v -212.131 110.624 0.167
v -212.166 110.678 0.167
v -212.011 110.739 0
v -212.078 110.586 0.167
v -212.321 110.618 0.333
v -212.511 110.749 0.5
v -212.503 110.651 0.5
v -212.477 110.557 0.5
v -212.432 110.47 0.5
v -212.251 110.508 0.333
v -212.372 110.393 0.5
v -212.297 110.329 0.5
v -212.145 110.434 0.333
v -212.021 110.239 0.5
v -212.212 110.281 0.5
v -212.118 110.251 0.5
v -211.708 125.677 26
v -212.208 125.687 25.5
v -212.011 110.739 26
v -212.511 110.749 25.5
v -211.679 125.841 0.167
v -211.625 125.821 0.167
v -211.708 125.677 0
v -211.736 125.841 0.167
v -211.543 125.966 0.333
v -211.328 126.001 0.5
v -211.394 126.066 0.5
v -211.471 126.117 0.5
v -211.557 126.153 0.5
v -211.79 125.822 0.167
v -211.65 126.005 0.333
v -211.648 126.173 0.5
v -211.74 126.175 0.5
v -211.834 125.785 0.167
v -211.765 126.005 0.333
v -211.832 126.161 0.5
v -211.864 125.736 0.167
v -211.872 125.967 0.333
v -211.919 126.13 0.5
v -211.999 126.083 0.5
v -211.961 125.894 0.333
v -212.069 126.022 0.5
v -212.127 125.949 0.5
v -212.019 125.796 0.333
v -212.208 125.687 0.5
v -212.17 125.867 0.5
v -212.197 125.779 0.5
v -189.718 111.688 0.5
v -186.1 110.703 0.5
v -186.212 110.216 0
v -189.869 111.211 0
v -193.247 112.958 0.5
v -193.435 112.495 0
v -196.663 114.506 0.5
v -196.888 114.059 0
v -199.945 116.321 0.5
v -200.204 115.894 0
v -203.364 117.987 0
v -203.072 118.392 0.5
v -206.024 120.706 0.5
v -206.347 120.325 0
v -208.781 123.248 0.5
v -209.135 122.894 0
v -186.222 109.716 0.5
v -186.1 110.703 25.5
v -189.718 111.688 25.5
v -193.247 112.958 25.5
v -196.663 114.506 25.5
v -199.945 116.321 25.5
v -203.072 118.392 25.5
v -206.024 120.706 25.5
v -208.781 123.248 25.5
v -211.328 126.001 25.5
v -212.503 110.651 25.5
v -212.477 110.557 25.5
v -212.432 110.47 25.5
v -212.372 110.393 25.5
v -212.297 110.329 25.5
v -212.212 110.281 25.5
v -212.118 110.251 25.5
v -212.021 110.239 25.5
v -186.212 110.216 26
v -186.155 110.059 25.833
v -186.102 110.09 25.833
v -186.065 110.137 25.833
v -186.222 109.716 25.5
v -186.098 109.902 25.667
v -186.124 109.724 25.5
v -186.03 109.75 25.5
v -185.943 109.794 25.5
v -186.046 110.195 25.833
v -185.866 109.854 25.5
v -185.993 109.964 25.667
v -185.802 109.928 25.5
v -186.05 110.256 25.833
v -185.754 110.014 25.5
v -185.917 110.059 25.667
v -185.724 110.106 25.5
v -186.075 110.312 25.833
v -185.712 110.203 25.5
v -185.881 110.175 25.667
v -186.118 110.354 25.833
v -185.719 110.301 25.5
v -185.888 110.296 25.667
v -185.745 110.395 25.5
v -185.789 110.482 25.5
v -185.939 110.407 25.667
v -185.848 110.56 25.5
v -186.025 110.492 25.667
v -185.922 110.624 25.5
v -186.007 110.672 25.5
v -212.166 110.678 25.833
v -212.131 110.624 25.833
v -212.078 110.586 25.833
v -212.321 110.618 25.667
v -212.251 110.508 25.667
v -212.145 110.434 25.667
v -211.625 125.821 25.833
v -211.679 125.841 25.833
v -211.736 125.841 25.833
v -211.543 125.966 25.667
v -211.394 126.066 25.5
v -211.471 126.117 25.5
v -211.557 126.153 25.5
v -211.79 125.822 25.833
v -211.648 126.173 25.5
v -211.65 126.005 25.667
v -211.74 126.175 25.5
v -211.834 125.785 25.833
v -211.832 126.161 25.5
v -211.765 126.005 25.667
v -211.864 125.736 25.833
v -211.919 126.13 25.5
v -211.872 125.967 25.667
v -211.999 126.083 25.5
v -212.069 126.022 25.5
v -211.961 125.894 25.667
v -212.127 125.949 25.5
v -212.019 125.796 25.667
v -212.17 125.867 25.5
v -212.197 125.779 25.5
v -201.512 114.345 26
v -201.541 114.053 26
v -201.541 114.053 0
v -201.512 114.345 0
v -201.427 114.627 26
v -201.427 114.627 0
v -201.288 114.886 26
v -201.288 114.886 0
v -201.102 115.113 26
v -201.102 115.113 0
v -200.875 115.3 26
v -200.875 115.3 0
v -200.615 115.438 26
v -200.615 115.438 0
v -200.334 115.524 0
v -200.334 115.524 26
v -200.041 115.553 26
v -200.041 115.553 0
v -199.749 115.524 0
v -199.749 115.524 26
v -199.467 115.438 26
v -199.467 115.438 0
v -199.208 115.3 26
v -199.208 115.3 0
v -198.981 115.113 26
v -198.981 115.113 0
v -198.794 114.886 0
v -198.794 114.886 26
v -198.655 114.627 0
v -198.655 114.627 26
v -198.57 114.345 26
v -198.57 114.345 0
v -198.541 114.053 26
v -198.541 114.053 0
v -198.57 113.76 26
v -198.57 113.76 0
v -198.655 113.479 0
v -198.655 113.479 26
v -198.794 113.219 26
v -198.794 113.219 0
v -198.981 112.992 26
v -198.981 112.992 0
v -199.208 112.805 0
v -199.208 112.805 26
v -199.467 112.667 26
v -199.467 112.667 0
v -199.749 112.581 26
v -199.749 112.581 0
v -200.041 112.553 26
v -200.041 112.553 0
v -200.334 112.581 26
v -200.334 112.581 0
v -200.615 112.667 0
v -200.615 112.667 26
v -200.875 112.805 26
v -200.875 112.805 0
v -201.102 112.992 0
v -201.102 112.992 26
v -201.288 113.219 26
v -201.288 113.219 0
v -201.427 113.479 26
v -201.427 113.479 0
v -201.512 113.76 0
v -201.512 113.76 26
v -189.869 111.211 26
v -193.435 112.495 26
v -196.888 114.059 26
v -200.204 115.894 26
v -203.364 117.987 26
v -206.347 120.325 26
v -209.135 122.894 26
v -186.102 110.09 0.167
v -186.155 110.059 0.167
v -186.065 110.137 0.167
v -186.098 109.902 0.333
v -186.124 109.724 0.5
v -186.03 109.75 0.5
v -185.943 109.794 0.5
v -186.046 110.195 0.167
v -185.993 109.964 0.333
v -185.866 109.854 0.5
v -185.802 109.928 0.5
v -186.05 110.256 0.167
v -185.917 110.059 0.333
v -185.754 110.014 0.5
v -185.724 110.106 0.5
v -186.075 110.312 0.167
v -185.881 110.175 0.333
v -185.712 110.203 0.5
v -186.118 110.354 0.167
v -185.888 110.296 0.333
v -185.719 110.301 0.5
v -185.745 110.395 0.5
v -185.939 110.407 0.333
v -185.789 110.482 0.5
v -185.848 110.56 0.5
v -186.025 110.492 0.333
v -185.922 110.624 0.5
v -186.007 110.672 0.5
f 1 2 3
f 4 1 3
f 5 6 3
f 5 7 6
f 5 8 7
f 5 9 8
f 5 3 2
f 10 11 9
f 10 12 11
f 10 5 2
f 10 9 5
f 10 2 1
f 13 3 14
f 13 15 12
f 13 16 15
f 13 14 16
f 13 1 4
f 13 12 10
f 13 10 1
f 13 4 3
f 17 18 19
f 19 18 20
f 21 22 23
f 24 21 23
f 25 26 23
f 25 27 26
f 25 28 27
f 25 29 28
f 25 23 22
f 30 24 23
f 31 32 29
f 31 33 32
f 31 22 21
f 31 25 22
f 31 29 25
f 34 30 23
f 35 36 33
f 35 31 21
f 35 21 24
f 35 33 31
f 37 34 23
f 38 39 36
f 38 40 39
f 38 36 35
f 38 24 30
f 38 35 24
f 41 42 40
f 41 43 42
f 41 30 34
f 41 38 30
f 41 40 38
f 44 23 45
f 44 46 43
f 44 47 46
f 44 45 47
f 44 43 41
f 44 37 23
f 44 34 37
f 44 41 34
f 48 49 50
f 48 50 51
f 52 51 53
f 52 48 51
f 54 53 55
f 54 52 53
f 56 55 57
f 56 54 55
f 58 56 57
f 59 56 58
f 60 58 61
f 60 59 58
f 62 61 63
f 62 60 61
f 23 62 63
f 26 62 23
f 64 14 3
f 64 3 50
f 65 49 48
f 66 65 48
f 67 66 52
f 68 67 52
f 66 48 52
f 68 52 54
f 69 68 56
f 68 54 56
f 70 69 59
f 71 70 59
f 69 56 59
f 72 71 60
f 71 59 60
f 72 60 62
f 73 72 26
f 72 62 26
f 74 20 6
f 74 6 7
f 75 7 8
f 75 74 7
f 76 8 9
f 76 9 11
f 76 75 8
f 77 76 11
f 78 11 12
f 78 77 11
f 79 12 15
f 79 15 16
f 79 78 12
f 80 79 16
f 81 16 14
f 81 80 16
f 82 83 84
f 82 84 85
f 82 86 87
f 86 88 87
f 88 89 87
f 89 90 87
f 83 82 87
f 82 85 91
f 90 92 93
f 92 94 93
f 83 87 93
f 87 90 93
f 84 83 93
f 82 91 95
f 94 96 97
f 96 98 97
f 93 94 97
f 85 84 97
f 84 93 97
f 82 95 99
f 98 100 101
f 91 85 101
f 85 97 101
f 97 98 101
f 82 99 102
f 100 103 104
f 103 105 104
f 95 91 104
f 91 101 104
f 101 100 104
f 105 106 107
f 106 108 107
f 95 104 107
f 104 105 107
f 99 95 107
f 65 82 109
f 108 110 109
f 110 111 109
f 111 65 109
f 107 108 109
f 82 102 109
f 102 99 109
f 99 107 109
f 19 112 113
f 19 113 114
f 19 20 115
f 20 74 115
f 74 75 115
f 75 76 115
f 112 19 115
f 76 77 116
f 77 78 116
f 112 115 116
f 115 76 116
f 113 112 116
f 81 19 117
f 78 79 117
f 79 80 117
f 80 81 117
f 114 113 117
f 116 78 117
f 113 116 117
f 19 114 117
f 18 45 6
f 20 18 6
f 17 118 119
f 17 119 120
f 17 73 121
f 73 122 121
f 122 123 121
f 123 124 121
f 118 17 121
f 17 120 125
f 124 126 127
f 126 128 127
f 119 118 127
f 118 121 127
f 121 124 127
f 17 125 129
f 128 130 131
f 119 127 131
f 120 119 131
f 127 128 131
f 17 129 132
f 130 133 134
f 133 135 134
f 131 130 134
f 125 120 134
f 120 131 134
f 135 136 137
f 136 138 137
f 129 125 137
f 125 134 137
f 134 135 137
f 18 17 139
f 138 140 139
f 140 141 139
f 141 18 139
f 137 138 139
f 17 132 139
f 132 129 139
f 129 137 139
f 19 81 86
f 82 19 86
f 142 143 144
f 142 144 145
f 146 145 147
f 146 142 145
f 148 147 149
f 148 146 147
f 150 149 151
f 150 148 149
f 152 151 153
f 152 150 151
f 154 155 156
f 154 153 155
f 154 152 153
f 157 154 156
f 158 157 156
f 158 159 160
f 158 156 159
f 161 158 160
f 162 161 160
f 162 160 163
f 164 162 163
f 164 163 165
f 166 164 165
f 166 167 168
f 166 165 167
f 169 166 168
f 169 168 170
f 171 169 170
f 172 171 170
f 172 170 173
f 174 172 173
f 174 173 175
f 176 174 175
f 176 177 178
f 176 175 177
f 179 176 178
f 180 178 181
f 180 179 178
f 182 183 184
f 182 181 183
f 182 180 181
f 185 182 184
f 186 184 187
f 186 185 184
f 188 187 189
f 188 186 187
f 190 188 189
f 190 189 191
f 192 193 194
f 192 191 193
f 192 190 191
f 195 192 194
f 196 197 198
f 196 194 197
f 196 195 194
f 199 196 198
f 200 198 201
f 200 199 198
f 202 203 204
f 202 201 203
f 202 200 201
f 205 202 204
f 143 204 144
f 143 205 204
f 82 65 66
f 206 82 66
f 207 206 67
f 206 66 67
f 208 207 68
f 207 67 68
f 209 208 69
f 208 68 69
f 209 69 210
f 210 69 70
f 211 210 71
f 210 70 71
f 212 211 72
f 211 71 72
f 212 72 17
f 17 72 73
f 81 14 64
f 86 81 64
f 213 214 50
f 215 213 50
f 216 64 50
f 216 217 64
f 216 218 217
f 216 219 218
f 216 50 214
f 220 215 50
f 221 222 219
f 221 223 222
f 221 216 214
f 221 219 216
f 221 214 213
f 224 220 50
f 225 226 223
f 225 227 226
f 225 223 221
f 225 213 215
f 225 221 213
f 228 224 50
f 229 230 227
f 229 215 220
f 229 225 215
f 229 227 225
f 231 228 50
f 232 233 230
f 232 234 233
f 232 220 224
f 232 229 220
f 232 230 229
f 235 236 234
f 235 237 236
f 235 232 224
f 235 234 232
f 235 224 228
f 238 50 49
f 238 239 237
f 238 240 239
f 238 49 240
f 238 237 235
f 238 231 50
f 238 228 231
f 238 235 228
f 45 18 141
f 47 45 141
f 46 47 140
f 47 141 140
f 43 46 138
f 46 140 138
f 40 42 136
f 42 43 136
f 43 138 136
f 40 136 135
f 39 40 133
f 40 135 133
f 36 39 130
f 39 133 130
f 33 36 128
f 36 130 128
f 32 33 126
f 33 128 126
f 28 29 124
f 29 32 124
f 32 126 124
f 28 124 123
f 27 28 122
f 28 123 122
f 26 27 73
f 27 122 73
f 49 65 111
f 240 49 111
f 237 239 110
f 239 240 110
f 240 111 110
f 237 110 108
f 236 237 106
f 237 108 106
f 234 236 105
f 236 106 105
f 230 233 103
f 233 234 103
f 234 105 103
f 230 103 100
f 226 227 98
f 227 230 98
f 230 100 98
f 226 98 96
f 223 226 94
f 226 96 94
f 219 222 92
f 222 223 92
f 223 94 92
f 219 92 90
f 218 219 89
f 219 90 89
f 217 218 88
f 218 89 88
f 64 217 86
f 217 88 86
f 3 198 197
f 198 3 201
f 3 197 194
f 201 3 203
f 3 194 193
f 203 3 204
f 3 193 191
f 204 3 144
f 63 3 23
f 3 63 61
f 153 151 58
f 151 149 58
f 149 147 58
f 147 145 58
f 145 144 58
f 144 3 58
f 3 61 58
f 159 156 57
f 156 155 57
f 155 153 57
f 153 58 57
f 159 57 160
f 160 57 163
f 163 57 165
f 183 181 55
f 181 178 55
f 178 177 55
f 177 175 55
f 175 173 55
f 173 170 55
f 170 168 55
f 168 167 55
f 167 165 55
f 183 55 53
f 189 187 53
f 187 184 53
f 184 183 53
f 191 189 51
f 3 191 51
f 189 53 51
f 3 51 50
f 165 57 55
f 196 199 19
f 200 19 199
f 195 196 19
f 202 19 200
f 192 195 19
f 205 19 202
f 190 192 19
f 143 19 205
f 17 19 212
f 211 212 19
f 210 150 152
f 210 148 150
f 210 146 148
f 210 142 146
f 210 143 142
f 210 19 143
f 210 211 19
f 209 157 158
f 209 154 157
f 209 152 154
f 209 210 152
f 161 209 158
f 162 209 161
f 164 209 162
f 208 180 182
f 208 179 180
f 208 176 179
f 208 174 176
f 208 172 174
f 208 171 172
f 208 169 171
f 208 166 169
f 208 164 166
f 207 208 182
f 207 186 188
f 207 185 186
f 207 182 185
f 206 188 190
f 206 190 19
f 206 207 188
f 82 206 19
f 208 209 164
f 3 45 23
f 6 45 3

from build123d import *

# Parameters (mm, degrees)
EXTRUDE_1_DEPTH          = 26
CUT_EXTRUDE_1_DEPTH      = 249.953347952
CUT_EXTRUDE_1_DEPTH_BACK = 249.953347952
SKETCH_2_R               = 1.5
FILLET_1_R               = 0.5
CHAMFER_1_SIZE           = 0.5


with BuildPart() as part:
    # 草图1 → 凸台-拉伸1 (new body)
    with BuildSketch(Plane.XY):
        with BuildLine():
            Line((-212.180704616, 127.029942007), (-212.520971413, 110.249281361))
            Line((-212.520971413, 110.249281361), (-176.528370185, 109.519447931))
            ThreePointArc((-176.528370185, 109.519447931), (-196.295218168, 114.323361589), (-212.180704616, 127.029942007))
        make_face()
    extrude(amount=EXTRUDE_1_DEPTH)

    # 草图2 → 切除-拉伸1 (cut, two sides: drawn at the far end of the back side and taken through both)
    with BuildSketch(Plane(origin=(0, 0, 0), x_dir=(-1, 0, 0), z_dir=(0, 0, -1)).offset(-CUT_EXTRUDE_1_DEPTH_BACK)):
        with Locations((200.041202679, 114.05266186)):
            Circle(SKETCH_2_R)
    extrude(amount=CUT_EXTRUDE_1_DEPTH + CUT_EXTRUDE_1_DEPTH_BACK, mode=Mode.SUBTRACT)

    # 圆角1
    fillet_1_edges = [part.edges().sort_by_distance(p)[0] for p in [
        (-212.520971413, 110.249281361, 13),
        (-176.528370185, 109.519447931, 13),
        (-212.180704616, 127.029942007, 13),
    ]]
    fillet(fillet_1_edges, radius=FILLET_1_R)

    # 倒角1
    chamfer_1_edges = [part.edges().sort_by_distance(p)[0] for p in [
        (-199.945178972, 116.321228968, 26),
        (-199.945178972, 116.321228968, 0),
        (-199.121405734, 109.977574103, 0),
        (-212.359389005, 118.217909462, 0),
        (-212.371585967, 110.392728938, 0),
        (-211.876239308, 126.147365712, 0),
        (-185.71538147, 110.154529202, 0),
        (-199.121405734, 109.977574103, 26),
        (-212.359389005, 118.217909462, 26),
        (-212.371585967, 110.392728938, 26),
        (-211.876239308, 126.147365712, 26),
        (-185.71538147, 110.154529202, 26),
    ]]
    chamfer(chamfer_1_edges, length=CHAMFER_1_SIZE)


solid = part.part
